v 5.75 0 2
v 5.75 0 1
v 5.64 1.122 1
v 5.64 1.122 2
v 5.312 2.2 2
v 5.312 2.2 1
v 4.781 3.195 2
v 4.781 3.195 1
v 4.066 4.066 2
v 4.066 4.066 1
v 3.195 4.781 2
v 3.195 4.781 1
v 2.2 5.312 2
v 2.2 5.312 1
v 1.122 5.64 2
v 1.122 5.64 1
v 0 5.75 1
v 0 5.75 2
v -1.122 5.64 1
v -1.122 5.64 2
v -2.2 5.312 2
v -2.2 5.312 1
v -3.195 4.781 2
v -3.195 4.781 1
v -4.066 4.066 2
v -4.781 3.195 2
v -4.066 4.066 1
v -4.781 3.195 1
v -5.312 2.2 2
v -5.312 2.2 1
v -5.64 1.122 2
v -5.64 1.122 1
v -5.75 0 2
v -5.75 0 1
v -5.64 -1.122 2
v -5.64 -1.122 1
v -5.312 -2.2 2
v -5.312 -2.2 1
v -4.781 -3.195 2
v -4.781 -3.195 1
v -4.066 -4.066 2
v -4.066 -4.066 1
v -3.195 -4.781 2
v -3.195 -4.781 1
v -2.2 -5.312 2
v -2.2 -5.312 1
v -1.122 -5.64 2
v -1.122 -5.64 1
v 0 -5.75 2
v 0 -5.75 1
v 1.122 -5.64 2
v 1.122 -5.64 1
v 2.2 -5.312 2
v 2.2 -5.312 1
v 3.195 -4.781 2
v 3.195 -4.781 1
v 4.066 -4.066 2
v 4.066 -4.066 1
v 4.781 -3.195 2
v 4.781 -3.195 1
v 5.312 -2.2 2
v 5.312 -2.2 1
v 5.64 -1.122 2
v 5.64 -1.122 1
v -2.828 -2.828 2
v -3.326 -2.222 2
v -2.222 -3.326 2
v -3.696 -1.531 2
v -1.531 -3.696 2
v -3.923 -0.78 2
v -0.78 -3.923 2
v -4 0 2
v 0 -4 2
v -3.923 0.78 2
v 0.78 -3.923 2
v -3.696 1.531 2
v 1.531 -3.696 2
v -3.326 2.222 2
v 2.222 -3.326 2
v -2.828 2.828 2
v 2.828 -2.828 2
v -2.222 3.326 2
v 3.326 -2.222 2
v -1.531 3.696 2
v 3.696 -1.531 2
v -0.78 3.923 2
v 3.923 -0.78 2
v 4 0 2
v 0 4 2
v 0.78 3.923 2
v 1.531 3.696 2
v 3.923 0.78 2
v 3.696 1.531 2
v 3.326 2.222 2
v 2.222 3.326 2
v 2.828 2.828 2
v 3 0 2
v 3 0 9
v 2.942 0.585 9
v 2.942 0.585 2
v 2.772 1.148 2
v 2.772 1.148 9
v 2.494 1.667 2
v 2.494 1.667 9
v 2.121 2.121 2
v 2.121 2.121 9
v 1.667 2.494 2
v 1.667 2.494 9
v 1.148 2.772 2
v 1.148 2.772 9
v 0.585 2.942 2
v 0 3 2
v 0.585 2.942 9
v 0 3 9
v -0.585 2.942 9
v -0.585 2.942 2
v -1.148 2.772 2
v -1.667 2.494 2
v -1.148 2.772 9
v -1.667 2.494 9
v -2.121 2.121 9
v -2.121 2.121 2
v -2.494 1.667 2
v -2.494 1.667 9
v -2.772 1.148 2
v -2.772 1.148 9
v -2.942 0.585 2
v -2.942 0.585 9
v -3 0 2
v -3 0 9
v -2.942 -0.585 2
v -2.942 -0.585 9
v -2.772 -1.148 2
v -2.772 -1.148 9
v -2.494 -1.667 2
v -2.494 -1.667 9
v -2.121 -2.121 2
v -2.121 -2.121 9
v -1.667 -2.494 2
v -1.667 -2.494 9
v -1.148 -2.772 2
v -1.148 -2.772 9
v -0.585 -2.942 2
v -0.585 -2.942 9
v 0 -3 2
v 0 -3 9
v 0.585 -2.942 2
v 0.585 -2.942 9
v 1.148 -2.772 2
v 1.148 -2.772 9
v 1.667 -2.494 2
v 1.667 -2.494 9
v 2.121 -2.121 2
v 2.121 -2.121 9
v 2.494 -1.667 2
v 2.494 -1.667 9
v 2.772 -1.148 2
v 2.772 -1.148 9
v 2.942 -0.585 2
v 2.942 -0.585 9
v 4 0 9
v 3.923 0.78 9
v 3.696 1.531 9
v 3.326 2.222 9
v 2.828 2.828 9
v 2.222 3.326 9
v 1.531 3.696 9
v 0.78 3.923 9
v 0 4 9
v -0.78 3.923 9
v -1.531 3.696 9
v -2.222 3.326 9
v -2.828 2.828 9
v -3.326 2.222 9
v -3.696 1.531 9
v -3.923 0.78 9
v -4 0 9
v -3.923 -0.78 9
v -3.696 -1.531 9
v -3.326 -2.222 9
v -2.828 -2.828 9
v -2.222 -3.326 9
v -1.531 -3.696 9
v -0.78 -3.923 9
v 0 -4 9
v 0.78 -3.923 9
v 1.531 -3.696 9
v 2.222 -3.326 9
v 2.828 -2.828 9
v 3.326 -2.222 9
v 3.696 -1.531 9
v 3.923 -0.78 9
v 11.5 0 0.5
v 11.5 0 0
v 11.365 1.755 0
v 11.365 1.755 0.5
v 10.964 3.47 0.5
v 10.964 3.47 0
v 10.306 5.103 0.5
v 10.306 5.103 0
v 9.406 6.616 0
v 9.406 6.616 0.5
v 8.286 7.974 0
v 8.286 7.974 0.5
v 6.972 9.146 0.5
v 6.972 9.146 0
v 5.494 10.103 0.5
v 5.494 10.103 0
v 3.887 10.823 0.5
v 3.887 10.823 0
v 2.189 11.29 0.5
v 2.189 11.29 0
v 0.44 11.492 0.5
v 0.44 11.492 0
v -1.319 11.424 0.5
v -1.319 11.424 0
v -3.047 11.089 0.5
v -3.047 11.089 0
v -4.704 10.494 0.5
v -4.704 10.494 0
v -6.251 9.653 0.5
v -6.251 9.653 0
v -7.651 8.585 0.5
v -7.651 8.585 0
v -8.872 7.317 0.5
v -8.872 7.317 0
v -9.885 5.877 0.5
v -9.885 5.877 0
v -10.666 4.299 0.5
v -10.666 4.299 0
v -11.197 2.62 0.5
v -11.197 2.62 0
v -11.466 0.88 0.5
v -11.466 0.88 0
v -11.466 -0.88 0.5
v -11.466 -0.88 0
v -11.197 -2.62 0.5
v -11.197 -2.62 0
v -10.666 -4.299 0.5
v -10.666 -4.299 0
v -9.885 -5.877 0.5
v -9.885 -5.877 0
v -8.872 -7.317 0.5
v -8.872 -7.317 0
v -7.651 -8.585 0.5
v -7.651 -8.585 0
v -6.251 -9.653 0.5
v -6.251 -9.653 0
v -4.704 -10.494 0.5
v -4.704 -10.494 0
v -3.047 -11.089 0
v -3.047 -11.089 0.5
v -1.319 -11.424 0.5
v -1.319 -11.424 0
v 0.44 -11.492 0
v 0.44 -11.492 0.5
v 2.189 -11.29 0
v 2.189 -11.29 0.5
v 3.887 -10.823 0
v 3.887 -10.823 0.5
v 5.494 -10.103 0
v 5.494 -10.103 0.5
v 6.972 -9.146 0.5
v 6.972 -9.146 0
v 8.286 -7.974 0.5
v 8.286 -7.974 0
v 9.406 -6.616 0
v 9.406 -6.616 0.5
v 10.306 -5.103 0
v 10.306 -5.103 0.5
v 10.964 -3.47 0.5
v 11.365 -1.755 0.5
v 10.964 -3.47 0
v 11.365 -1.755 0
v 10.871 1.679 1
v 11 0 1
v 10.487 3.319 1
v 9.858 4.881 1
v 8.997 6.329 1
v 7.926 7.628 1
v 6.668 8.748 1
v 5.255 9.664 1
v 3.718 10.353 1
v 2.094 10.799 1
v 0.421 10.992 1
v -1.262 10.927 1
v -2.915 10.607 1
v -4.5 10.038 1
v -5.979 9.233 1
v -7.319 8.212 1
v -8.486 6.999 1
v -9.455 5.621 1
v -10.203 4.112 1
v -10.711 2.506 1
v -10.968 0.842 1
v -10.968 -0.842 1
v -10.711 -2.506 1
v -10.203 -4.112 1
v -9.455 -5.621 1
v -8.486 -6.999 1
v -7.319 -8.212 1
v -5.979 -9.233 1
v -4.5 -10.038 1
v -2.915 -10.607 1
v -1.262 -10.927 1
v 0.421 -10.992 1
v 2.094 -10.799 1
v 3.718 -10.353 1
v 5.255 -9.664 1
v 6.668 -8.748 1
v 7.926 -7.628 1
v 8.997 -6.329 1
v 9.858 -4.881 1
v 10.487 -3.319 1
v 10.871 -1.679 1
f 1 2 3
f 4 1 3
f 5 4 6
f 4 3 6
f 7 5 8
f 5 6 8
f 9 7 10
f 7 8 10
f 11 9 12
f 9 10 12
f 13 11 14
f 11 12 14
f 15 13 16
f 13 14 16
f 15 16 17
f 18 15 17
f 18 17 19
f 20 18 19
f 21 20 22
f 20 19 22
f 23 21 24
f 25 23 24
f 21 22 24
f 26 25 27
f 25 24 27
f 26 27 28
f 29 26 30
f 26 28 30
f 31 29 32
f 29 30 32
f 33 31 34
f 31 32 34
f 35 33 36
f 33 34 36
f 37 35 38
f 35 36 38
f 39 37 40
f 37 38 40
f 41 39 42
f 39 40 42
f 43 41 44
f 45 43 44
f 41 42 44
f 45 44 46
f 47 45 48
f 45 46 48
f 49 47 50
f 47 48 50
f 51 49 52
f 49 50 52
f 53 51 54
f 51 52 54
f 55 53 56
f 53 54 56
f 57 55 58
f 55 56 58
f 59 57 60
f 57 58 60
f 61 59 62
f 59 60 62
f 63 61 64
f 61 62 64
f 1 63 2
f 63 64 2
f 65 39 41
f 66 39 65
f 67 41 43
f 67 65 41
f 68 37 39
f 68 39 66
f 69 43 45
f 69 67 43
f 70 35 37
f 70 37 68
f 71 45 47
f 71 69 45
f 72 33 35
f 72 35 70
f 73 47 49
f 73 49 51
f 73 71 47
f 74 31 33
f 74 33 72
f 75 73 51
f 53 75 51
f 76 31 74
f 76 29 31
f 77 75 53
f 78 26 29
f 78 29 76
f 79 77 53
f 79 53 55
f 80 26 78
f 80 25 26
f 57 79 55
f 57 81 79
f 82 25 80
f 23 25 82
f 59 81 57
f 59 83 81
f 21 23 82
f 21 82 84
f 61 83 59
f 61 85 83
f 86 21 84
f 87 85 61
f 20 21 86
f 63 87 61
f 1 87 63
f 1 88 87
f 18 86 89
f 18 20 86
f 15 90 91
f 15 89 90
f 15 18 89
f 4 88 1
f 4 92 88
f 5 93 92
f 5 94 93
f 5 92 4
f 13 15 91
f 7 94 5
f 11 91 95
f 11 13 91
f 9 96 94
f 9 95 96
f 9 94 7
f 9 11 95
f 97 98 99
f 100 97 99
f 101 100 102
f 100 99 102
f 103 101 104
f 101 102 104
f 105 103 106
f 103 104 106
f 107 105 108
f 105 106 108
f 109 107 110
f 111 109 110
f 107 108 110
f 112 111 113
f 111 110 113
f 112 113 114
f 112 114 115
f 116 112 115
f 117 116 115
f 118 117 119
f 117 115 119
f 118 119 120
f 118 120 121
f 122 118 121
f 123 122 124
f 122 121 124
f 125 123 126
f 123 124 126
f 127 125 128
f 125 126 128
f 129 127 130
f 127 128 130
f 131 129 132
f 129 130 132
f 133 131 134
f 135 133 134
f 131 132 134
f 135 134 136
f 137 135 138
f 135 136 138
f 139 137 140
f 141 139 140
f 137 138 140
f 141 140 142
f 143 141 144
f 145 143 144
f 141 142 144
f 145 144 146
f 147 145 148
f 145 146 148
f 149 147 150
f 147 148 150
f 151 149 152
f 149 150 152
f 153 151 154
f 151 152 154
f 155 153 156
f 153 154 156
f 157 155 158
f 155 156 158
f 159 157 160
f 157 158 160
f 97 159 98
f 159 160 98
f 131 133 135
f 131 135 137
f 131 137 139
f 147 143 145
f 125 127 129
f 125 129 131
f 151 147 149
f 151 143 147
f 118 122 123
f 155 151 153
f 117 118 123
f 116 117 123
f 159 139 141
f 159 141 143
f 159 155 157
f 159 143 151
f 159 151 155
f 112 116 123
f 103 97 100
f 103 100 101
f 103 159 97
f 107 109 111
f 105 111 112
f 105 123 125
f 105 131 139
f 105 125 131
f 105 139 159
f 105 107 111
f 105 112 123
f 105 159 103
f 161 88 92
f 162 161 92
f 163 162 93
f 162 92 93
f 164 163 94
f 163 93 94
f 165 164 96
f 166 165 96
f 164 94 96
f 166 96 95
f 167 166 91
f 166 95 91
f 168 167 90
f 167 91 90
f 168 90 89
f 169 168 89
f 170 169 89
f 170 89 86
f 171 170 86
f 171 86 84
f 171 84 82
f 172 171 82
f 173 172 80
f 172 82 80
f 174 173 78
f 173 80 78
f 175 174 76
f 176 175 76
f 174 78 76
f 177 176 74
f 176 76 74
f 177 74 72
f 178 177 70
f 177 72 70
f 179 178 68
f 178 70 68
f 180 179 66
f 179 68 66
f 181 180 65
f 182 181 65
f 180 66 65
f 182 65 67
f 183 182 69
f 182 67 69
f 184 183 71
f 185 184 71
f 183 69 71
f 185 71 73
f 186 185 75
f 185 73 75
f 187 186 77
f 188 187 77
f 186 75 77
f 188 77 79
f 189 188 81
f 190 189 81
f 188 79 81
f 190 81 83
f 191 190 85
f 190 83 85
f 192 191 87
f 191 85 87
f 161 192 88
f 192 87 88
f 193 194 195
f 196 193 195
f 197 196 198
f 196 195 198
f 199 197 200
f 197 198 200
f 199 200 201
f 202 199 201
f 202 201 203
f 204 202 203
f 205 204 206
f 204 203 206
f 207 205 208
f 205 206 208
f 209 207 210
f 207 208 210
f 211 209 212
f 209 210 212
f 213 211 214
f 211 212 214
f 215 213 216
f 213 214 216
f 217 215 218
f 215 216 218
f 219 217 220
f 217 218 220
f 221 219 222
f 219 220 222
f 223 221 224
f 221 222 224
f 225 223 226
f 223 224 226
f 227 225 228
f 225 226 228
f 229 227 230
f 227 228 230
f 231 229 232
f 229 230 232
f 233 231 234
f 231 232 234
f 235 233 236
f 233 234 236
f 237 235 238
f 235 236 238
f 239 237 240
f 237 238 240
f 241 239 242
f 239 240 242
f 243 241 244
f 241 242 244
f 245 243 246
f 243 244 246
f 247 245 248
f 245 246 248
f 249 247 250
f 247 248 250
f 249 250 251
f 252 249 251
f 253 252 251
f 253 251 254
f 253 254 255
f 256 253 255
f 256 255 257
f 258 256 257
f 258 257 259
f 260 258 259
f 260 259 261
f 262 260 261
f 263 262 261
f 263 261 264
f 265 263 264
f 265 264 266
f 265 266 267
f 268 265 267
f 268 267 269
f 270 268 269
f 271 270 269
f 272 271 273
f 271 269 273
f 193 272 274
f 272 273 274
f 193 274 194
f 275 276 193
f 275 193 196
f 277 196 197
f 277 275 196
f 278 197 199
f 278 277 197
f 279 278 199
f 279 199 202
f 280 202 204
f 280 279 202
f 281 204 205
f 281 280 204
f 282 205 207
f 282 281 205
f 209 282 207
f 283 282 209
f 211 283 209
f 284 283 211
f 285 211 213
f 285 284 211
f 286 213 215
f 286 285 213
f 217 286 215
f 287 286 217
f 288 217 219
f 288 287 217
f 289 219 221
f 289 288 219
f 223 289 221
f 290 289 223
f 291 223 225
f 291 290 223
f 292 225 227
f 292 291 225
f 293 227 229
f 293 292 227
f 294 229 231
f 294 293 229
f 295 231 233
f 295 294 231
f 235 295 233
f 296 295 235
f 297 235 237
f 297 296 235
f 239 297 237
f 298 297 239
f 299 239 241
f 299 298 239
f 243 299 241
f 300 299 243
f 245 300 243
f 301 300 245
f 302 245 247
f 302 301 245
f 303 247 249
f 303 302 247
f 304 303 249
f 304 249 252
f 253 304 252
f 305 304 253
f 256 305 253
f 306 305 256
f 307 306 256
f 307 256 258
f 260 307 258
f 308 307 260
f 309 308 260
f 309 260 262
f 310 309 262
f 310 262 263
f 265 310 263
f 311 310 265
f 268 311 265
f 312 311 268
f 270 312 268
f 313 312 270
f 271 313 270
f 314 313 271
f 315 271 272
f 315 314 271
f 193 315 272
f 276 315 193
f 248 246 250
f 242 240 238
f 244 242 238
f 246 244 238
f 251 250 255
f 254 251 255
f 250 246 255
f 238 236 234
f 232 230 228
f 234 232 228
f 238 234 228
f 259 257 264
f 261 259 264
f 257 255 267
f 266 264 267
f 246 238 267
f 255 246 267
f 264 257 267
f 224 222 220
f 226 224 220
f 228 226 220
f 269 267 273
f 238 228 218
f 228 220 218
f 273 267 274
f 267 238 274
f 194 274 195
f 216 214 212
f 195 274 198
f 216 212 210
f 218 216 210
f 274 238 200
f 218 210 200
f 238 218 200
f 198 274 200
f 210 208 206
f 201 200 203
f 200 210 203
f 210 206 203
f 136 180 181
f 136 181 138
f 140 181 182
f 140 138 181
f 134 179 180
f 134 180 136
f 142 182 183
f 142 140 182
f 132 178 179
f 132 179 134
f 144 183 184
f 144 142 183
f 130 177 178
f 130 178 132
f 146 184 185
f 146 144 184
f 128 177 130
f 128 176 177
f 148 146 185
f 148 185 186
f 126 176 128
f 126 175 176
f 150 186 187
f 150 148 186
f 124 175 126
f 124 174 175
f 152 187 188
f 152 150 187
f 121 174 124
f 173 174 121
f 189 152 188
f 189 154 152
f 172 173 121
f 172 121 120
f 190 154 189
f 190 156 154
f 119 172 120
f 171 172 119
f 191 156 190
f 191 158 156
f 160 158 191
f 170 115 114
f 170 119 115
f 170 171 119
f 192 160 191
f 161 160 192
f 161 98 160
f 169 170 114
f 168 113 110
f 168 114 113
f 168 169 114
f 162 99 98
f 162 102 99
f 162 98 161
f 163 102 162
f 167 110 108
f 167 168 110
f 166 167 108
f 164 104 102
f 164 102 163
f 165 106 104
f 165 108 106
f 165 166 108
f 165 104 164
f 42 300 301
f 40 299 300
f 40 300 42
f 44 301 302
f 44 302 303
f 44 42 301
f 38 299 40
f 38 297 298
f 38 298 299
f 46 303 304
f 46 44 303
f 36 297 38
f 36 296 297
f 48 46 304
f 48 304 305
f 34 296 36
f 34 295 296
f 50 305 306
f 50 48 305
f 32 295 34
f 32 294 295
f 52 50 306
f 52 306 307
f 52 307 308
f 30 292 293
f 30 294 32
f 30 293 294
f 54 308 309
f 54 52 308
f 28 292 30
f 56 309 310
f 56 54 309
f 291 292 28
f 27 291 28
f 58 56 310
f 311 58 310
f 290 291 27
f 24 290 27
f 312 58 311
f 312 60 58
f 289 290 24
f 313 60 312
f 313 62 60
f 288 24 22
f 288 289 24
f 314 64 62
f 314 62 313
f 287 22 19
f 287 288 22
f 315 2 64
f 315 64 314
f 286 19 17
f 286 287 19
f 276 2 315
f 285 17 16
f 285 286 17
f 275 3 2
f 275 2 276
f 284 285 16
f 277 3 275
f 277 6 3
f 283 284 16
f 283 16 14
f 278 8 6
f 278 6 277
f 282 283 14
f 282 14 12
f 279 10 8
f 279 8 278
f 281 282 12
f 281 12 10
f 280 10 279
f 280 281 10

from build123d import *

# Parameters (mm, degrees)
F0_R     = 11.5
F1_DEPTH = 1
F2_R     = 5.75
F3_DEPTH = 1
F4_R     = 4
F5_DEPTH = 7
F6_R     = 3
F7_DEPTH = 7
F8_SIZE  = 0.5


with BuildPart() as f1:
    # F0 (on Top) → F1 (new body)
    with BuildSketch(Plane.XY):
        Circle(F0_R)
    extrude(amount=F1_DEPTH)

    # F2 (on face) → F3 (join)
    with BuildSketch(Plane.XY.offset(1)):
        Circle(F2_R)
    extrude(amount=F3_DEPTH)

    # F4 (on face) → F5 (join)
    with BuildSketch(Plane.XY.offset(2)):
        Circle(F4_R)
    extrude(amount=F5_DEPTH)

    # F6 (on face) → F7 (cut)
    with BuildSketch(Plane.XY.offset(9)):
        Circle(F6_R)
    extrude(amount=-F7_DEPTH, mode=Mode.SUBTRACT)

    # F8
    f8_edges = [f1.edges().sort_by_distance(p)[0] for p in [
        (-11.5, 0, 1),
    ]]
    chamfer(f8_edges, length=F8_SIZE)


solid = f1.part
